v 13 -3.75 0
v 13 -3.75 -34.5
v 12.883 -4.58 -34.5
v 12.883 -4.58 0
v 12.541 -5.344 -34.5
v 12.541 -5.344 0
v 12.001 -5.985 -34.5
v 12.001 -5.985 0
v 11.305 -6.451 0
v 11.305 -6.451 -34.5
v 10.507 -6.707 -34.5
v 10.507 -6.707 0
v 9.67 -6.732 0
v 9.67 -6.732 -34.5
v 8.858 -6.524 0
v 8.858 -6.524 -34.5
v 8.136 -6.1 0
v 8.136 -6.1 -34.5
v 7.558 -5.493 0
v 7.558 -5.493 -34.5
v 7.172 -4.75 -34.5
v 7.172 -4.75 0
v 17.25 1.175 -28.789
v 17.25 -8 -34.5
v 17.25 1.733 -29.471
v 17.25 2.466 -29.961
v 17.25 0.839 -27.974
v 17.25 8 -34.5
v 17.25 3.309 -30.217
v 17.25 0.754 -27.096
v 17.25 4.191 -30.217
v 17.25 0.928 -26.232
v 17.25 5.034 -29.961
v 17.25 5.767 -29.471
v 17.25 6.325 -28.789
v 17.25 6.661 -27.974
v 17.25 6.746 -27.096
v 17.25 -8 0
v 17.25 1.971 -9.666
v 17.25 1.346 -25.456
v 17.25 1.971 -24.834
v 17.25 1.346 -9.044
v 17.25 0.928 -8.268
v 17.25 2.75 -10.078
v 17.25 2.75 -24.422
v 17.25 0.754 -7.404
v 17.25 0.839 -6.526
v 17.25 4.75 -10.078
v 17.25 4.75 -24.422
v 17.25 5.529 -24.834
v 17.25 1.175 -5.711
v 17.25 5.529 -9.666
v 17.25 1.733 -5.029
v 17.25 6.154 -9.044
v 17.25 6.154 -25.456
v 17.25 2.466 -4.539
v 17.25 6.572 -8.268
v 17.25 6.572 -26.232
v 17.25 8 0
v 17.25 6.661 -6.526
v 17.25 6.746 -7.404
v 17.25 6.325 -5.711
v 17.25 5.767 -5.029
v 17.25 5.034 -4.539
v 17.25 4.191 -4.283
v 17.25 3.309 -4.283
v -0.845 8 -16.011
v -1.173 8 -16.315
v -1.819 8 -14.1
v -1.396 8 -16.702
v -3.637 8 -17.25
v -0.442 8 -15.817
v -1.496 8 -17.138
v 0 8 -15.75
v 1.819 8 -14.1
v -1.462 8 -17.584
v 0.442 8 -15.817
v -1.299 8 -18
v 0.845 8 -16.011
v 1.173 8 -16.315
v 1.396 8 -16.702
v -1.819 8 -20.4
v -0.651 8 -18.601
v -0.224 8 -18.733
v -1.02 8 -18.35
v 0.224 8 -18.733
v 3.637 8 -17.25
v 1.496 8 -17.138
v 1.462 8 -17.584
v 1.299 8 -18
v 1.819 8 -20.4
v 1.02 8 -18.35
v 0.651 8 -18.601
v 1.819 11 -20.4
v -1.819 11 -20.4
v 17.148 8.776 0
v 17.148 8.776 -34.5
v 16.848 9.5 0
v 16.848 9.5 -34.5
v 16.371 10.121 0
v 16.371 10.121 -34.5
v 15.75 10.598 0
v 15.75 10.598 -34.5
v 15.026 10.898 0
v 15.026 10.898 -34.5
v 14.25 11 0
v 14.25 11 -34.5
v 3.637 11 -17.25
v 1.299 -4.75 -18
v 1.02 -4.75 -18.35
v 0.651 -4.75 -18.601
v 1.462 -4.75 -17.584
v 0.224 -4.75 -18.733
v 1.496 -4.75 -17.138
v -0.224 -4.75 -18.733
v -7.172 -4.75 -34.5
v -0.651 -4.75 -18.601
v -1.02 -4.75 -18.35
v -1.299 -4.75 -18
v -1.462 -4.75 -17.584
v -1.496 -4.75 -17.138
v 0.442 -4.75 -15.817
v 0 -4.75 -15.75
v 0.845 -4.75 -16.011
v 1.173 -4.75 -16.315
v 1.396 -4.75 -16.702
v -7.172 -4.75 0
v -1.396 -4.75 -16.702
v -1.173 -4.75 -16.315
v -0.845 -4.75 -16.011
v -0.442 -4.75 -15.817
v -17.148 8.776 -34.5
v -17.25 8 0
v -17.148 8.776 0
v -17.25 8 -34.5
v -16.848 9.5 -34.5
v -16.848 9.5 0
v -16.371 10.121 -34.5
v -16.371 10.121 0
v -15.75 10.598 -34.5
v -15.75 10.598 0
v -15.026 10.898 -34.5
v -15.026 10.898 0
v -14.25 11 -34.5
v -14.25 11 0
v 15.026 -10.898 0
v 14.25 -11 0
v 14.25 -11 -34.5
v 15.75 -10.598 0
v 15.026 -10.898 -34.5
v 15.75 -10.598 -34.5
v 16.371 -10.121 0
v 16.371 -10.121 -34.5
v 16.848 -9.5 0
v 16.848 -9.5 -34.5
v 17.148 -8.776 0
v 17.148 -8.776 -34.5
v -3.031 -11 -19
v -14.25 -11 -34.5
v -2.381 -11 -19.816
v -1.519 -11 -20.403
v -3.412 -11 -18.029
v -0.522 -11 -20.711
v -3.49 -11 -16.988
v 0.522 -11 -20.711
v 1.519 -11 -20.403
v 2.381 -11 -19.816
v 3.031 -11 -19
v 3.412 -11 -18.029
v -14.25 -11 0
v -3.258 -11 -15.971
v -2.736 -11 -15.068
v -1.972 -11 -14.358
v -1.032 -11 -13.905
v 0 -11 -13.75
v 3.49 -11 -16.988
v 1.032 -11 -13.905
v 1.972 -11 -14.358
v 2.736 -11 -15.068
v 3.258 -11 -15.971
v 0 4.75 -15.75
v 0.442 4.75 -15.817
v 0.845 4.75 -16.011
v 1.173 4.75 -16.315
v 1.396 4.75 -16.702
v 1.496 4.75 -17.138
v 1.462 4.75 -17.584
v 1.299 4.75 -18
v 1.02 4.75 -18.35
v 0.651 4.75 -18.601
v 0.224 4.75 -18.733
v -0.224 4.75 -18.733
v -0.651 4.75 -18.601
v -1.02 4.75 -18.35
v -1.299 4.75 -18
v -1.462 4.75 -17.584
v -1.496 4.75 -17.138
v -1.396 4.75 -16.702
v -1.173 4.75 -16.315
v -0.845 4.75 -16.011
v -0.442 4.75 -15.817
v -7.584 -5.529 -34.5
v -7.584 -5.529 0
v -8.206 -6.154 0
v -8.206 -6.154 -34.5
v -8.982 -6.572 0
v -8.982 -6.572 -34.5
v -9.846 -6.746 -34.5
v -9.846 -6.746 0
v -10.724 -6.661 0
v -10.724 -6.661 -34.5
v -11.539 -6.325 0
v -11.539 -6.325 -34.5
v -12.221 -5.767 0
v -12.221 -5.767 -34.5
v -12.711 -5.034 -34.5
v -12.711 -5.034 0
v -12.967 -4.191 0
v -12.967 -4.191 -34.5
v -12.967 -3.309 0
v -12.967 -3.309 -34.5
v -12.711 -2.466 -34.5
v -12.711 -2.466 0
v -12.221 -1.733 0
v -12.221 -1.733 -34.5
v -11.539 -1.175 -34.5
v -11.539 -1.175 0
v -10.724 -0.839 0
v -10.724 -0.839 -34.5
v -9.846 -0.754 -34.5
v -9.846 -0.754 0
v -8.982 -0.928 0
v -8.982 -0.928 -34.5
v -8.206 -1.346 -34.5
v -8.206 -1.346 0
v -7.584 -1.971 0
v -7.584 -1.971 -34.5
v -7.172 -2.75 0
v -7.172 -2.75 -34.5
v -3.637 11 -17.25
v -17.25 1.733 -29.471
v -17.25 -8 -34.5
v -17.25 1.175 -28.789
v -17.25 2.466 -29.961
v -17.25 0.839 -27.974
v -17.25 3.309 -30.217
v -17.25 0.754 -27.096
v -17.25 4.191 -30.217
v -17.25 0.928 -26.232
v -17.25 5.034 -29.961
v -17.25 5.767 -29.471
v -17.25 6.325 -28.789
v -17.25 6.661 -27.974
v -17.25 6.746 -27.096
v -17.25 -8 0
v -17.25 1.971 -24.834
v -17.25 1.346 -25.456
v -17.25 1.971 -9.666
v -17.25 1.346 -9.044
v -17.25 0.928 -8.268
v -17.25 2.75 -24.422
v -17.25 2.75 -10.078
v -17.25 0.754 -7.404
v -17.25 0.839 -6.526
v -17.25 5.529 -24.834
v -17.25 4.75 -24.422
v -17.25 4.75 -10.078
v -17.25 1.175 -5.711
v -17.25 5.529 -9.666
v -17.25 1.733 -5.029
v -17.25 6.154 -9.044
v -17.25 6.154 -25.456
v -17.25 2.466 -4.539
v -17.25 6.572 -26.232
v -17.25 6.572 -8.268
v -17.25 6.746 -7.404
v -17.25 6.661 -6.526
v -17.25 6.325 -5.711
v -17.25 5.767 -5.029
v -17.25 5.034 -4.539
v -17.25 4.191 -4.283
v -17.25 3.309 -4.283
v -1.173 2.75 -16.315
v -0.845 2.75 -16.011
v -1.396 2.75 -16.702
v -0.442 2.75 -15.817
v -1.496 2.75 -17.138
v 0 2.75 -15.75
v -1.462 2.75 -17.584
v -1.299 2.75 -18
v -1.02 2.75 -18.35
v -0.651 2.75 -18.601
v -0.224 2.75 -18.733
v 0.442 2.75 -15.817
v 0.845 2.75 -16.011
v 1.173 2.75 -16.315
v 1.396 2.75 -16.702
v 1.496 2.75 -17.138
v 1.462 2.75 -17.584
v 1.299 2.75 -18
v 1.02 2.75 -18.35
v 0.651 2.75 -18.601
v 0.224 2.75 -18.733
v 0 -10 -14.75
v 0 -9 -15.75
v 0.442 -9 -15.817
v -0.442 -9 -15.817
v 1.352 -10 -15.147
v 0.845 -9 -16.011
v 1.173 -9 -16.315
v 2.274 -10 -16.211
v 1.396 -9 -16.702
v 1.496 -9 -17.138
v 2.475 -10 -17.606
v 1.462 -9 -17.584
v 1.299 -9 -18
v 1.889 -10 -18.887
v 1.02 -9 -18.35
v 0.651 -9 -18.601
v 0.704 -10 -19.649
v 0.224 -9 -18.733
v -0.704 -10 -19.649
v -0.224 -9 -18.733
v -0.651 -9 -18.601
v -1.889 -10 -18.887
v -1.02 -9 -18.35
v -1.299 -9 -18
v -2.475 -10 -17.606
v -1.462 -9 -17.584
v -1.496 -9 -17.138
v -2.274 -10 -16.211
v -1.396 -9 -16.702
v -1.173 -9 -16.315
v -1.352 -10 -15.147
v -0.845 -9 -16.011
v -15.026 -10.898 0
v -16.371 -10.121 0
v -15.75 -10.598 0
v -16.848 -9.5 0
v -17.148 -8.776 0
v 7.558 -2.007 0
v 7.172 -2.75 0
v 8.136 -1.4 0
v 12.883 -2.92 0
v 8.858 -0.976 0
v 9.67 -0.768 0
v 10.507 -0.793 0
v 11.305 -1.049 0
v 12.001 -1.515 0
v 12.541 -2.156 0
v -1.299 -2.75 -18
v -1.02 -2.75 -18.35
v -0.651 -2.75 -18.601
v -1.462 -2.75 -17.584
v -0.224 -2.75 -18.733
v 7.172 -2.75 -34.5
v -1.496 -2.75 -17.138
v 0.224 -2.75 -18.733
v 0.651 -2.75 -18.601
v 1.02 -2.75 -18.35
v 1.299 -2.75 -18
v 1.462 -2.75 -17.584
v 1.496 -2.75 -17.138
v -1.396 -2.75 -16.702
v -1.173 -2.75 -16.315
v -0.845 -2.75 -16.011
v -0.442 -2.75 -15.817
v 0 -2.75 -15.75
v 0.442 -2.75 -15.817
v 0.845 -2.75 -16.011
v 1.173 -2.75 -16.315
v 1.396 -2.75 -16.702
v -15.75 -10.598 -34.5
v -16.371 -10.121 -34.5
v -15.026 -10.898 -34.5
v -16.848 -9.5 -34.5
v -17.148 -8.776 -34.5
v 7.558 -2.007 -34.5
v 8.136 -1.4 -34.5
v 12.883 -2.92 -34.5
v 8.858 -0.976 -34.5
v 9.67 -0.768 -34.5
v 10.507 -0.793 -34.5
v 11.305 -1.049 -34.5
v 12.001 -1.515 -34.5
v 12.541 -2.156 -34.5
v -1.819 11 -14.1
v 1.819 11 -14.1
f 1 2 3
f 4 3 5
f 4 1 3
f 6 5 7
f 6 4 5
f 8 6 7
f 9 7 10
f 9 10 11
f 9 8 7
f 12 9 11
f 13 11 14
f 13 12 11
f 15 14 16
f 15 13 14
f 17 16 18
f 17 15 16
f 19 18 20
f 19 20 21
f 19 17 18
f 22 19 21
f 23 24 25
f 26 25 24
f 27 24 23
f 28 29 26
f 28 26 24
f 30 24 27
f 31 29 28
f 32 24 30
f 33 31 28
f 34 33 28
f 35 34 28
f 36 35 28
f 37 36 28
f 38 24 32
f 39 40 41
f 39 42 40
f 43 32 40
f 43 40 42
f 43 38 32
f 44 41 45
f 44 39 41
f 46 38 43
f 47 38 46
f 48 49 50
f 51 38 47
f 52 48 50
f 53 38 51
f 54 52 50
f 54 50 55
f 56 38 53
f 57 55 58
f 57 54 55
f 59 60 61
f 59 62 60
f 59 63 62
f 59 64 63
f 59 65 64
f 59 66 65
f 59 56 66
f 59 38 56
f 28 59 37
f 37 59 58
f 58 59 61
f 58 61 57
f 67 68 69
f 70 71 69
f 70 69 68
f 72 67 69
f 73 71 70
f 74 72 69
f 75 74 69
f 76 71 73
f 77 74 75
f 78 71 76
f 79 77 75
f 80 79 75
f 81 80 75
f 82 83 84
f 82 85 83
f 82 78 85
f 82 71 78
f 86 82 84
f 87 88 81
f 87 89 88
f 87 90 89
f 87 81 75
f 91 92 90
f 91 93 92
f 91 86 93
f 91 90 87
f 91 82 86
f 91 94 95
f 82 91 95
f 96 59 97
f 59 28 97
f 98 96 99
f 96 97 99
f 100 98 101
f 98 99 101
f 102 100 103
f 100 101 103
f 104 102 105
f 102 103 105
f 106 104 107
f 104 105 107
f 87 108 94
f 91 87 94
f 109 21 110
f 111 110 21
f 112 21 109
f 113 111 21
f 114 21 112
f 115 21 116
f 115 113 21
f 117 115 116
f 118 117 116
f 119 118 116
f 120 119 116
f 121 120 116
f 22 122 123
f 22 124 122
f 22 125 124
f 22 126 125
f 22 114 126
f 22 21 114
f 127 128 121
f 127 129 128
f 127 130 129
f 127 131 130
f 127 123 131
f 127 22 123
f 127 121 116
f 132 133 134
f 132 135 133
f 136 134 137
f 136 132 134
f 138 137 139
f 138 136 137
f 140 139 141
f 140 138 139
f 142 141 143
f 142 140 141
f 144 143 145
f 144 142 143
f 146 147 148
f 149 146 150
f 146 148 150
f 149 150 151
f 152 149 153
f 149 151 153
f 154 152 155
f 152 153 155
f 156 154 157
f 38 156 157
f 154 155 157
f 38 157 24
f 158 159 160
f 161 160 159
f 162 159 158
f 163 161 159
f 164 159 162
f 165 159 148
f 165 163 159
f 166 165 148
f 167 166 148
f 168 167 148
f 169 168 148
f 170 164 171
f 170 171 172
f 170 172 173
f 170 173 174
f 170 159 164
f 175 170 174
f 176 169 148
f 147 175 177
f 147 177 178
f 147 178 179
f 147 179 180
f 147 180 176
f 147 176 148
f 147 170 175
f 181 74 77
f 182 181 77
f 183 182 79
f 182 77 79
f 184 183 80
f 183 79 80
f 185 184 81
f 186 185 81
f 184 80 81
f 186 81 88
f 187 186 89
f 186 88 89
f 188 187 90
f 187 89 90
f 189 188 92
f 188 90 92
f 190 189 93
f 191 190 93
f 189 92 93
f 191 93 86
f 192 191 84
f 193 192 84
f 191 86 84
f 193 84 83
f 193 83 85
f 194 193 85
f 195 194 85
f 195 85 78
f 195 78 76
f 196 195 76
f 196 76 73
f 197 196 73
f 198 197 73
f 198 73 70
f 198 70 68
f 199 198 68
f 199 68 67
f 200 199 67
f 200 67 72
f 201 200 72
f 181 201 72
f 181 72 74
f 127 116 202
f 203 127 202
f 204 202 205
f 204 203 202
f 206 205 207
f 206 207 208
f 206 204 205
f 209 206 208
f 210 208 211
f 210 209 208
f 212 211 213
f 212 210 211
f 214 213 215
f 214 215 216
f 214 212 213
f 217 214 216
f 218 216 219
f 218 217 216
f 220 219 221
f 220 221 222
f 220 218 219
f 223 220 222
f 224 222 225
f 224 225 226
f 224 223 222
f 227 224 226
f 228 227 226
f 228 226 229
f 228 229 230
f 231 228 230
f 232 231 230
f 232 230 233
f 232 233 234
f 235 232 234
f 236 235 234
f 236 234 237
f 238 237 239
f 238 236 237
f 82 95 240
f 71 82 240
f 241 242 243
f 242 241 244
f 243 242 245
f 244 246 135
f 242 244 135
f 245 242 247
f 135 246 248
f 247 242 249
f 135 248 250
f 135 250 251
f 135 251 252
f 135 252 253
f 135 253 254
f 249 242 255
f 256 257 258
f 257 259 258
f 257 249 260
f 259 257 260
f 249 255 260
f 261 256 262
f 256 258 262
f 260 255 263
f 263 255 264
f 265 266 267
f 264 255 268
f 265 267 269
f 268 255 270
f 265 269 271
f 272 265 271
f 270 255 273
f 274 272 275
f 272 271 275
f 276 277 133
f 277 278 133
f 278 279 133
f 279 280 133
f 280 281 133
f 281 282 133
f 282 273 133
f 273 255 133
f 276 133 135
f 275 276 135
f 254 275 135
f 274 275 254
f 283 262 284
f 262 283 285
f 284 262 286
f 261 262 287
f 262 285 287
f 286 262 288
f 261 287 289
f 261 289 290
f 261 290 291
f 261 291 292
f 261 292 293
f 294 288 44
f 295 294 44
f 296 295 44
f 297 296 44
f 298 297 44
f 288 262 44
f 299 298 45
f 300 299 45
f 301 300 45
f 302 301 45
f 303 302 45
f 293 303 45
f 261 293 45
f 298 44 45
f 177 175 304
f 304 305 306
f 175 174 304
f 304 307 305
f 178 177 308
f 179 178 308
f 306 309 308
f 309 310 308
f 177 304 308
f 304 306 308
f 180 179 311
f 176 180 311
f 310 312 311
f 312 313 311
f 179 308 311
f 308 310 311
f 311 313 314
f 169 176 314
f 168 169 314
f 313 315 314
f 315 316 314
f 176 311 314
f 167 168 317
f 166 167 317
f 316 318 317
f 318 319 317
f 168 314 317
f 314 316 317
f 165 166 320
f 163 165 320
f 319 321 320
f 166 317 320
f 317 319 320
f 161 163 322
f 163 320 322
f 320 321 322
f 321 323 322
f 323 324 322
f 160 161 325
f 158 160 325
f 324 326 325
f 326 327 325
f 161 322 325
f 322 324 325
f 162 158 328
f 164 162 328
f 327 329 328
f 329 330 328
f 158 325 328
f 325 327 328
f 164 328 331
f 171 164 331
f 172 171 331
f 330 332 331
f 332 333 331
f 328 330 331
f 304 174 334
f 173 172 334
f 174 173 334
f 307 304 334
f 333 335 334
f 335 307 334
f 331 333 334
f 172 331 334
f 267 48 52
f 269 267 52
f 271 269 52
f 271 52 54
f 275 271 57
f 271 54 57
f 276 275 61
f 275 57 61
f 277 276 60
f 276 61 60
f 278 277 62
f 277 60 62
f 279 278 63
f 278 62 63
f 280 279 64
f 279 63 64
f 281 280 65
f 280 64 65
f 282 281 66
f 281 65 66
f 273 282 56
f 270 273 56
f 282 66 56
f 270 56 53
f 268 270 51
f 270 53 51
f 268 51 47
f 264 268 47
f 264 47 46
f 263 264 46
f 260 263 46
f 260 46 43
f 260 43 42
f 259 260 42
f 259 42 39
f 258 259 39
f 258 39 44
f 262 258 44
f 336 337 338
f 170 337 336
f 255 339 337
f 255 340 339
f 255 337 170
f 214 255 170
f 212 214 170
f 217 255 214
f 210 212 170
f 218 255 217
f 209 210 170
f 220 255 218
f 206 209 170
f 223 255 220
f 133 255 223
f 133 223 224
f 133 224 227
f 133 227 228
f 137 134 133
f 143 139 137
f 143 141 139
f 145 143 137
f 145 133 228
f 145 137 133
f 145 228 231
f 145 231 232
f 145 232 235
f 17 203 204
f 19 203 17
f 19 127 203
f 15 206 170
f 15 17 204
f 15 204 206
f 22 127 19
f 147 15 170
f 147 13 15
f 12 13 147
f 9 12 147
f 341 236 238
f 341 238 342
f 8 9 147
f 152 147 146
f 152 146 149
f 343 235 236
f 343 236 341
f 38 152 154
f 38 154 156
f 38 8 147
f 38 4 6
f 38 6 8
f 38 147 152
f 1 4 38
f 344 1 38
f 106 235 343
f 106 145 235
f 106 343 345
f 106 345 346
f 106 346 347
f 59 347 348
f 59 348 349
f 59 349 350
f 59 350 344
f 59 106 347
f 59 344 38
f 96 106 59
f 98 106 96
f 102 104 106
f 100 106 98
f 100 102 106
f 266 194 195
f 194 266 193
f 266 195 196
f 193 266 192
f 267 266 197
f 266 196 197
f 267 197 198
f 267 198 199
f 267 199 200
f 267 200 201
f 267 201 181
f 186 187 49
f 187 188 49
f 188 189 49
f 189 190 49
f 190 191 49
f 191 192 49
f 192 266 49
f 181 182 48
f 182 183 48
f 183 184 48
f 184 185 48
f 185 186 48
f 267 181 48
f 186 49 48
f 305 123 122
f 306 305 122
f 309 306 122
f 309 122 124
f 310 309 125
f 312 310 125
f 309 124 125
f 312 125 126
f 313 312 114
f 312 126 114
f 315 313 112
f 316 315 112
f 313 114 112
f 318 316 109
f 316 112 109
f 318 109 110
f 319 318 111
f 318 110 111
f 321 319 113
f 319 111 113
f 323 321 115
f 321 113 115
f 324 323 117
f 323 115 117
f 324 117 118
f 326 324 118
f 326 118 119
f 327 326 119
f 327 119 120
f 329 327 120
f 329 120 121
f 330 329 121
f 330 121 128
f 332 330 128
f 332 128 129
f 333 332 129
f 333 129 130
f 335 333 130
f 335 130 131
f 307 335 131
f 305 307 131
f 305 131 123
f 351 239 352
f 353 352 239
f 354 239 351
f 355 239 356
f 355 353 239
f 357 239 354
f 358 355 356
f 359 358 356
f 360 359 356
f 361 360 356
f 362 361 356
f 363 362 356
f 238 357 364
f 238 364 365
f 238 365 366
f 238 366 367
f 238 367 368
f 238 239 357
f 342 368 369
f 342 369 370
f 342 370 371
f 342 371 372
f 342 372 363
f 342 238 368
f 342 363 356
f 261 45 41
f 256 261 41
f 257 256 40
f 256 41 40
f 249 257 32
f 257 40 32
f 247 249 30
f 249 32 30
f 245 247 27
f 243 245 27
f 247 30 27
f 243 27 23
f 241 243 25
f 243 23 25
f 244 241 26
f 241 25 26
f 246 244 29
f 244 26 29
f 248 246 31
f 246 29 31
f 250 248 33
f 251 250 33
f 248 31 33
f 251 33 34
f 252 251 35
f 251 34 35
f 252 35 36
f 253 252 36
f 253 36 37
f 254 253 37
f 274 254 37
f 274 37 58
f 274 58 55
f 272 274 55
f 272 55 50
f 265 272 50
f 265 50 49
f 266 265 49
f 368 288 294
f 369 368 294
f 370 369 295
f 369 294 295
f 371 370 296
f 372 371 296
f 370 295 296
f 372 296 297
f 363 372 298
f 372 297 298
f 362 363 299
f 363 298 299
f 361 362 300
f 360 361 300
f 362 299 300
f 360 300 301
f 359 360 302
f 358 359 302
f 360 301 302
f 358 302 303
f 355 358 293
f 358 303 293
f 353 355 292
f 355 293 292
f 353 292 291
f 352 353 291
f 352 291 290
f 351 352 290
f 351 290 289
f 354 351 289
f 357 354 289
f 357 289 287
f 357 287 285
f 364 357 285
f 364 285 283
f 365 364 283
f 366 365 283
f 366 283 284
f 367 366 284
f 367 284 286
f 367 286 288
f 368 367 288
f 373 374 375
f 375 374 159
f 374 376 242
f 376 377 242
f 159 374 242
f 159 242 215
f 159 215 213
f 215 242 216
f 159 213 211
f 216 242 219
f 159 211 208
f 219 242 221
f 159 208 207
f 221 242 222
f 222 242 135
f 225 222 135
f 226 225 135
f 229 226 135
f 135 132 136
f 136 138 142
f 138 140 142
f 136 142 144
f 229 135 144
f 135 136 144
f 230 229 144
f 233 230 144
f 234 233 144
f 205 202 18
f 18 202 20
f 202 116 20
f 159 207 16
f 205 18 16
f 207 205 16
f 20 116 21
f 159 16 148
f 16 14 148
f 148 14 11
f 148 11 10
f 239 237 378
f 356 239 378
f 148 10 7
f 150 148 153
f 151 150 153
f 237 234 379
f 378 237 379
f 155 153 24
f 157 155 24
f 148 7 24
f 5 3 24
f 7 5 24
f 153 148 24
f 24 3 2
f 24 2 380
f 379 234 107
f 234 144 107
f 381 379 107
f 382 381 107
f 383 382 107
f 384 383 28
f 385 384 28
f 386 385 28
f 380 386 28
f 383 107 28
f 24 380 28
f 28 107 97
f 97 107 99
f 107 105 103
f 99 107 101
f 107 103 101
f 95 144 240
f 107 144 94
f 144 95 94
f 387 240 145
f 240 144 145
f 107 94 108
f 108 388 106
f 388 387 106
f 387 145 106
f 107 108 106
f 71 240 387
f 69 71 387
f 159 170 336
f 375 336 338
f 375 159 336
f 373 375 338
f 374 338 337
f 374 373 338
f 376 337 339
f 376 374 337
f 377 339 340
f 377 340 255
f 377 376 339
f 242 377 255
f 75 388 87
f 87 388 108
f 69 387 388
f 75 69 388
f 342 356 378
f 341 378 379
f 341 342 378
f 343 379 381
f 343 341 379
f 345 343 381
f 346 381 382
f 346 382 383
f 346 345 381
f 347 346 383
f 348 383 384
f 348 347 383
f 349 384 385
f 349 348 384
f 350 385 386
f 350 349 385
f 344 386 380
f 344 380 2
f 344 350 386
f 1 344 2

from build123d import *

# Parameters (mm, degrees)
SKETCH1_W           = 34.5
SKETCH1_H           = 22
BOSS_EXTRUDE1_DEPTH = 34.5
CUT_EXTRUDE1_DEPTH  = 51.014997751
CUT_EXTRUDE2_DEPTH  = 3
SKETCH3_3_R         = 1.5
CUT_EXTRUDE3_DEPTH  = 45.405095428
CHAMFER1_SIZE       = 2
FILLET1_R           = 3


with BuildPart() as part:
    # Sketch1 → Boss-Extrude1 (new body)
    with BuildSketch(Plane.XY):
        Rectangle(SKETCH1_W, SKETCH1_H)
        with BuildLine():
            ThreePointArc((-7.171572875, -4.75), (-13, -3.75), (-7.171572875, -2.75))
            Line((-7.171572875, -2.75), (7.171572875, -2.75))
            ThreePointArc((7.171572875, -2.75), (10.507305936, -0.793204321), (13, -3.75))
            ThreePointArc((13, -3.75), (10.507305936, -6.706795679), (7.171572875, -4.75))
            Line((7.171572875, -4.75), (-7.171572875, -4.75))
        make_face(mode=Mode.SUBTRACT)
    extrude(amount=-BOSS_EXTRUDE1_DEPTH)

    # Sketch2 → Cut-Extrude1 (cut, through all)
    with BuildSketch(Plane(origin=(17.25, 0, 0), x_dir=(0, 0, -1), z_dir=(1, 0, 0))):
        with BuildLine():
            Line((10.078427125, 2.75), (24.421572875, 2.75))
            ThreePointArc((24.421572875, 2.75), (30.25, 3.75), (24.421572875, 4.75))
            Line((24.421572875, 4.75), (10.078427125, 4.75))
            ThreePointArc((10.078427125, 4.75), (4.25, 3.75), (10.078427125, 2.75))
        make_face()
    extrude(amount=-CUT_EXTRUDE1_DEPTH, mode=Mode.SUBTRACT)

    # Sketch3 → Cut-Extrude2 (cut)
    with BuildSketch(Plane(origin=(0, 11, 0), x_dir=(1, 0, 0), z_dir=(0, 1, 0))):
        Polygon((1.818653348, 20.4), (-1.818653348, 20.4), (-3.637306696, 17.25), (-1.818653348, 14.1), (1.818653348, 14.1), (3.637306696, 17.25), align=None)
    extrude(amount=-CUT_EXTRUDE2_DEPTH, mode=Mode.SUBTRACT)

    # Sketch3<3> → Cut-Extrude3 (cut, through all)
    with BuildSketch(Plane(origin=(0, 11, 0), x_dir=(1, 0, 0), z_dir=(0, 1, 0))):
        with Locations((0, 17.25)):
            Circle(SKETCH3_3_R)
    extrude(amount=-CUT_EXTRUDE3_DEPTH, mode=Mode.SUBTRACT)

    # Chamfer1
    chamfer1_edges = [part.edges().sort_by_distance(p)[0] for p in [
        (-1.5, -11, -17.25),
    ]]
    chamfer(chamfer1_edges, length=CHAMFER1_SIZE)

    # Fillet1
    fillet1_edges = [part.edges().sort_by_distance(p)[0] for p in [
        (-17.25, -11, -17.25),
        (17.25, -11, -17.25),
        (17.25, 11, -17.25),
        (-17.25, 11, -17.25),
    ]]
    fillet(fillet1_edges, radius=FILLET1_R)


solid = part.part
